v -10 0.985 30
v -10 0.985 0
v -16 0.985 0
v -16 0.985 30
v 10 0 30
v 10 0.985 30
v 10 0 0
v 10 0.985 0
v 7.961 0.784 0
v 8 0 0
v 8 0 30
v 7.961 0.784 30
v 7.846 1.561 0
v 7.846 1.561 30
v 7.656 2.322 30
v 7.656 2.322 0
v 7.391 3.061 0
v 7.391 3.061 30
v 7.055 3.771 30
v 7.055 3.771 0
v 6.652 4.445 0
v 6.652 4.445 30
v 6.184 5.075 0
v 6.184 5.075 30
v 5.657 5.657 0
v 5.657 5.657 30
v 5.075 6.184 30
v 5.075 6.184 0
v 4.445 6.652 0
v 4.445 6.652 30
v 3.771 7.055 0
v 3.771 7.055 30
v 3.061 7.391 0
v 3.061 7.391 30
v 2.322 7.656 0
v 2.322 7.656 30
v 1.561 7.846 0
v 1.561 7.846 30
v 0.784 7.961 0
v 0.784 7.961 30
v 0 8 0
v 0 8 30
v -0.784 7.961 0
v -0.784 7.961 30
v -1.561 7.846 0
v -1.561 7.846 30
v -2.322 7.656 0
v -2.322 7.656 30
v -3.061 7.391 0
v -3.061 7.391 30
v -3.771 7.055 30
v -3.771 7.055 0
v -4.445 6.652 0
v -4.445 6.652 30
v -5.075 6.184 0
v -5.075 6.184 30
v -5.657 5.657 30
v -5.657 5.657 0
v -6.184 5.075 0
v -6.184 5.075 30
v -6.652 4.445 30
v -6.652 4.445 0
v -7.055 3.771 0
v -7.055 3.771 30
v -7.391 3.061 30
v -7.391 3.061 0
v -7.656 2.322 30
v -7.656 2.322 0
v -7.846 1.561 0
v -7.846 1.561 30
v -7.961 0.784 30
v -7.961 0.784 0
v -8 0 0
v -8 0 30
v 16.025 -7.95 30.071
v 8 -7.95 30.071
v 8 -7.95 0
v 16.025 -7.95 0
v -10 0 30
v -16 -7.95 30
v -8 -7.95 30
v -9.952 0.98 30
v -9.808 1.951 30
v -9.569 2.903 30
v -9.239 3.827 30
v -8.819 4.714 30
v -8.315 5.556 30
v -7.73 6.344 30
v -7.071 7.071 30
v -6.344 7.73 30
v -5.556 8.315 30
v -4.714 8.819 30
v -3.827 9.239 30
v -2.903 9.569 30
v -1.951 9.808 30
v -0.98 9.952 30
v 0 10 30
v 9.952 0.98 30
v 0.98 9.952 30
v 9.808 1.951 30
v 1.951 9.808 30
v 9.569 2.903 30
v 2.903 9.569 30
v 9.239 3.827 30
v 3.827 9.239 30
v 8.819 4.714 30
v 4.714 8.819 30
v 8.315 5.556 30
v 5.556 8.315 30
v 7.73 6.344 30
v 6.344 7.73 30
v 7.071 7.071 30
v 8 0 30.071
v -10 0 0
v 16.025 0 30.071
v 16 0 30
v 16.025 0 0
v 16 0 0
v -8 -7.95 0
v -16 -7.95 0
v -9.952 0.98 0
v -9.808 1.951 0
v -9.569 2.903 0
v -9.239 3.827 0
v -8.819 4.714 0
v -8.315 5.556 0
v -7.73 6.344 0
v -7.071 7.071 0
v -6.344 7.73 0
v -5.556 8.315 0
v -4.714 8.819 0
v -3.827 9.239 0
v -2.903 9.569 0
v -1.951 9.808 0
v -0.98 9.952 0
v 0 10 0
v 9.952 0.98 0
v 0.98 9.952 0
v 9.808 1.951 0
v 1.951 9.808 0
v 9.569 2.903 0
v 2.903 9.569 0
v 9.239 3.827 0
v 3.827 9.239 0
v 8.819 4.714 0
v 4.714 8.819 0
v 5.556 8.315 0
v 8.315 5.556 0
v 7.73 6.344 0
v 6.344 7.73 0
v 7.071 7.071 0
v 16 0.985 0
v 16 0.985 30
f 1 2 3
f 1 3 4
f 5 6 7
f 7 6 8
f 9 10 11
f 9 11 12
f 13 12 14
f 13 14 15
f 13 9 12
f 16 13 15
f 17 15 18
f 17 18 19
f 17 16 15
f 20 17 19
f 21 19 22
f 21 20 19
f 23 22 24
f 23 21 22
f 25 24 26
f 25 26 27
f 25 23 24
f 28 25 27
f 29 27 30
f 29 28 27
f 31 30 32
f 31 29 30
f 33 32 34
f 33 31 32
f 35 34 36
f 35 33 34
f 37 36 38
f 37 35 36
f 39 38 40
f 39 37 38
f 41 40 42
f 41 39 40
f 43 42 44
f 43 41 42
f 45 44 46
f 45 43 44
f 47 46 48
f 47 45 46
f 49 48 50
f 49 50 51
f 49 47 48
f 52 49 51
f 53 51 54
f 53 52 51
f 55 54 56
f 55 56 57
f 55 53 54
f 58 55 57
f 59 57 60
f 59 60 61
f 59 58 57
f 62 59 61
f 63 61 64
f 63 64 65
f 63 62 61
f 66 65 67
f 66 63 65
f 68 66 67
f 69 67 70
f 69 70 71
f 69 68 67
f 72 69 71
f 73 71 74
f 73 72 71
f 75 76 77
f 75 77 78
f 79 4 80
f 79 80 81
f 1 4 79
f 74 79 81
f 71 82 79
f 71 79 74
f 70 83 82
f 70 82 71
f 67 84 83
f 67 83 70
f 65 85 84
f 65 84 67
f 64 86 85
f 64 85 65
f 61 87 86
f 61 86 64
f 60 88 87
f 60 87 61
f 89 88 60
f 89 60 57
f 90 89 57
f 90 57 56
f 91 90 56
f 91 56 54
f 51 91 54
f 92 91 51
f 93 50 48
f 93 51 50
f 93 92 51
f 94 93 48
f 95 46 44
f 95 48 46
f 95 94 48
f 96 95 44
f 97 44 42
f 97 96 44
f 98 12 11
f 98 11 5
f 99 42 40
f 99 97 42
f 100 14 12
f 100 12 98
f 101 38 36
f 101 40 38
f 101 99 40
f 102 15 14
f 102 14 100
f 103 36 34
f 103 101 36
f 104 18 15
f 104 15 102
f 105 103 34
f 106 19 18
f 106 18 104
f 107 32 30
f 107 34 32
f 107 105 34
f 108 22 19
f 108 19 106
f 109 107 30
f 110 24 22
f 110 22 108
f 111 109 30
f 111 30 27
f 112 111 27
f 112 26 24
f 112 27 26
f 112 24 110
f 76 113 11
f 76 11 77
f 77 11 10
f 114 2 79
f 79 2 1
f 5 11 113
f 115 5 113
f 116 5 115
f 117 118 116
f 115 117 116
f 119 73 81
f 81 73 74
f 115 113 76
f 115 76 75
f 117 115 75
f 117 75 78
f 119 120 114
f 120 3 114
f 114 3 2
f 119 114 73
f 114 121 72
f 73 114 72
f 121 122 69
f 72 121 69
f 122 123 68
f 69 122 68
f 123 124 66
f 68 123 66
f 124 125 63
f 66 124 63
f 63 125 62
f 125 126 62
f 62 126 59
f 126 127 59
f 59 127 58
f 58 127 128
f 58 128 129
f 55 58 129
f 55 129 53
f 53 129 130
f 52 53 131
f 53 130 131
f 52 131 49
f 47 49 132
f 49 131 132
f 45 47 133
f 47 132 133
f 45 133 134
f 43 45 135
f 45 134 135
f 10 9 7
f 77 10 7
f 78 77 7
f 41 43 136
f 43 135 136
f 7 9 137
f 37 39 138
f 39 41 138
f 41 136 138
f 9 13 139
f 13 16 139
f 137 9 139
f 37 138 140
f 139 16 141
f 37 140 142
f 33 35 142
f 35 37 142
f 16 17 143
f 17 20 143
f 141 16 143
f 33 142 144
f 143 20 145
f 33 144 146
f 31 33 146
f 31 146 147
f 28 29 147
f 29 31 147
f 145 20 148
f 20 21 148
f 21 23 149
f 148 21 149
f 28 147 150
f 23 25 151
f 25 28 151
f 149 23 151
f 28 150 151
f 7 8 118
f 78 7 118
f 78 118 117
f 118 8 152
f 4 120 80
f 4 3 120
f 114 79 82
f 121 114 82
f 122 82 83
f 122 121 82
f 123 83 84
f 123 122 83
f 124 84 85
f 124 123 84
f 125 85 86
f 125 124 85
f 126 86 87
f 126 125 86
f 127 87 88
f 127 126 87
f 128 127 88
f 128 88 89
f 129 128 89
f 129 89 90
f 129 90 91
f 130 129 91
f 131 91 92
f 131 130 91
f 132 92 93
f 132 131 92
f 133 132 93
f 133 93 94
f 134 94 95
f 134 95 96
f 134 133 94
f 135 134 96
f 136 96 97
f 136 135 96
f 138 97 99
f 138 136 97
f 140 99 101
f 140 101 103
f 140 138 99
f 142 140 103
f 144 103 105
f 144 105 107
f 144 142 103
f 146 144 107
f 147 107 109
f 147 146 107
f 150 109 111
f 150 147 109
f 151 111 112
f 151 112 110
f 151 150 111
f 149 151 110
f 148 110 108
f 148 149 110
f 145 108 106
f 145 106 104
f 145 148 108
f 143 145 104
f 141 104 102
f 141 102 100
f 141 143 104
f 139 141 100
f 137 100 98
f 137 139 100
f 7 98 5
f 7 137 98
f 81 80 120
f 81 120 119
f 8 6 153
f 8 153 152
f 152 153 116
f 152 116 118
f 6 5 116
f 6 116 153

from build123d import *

# Parameters (mm, degrees)
EXTRUDE_THIN1_DEPTH = 30
SKETCH2_W           = 30
SKETCH2_H           = 0.984822369
BOSS_EXTRUDE1_DEPTH = 6
SKETCH3_W           = 30
SKETCH3_H           = 0.984822369
BOSS_EXTRUDE2_DEPTH = 6
SKETCH7_W           = 8.024735178
SKETCH7_H           = 30.071065223
BOSS_EXTRUDE3_DEPTH = 7.95
SKETCH9_W           = 8
SKETCH9_H           = 30
BOSS_EXTRUDE5_DEPTH = 7.95


with BuildPart() as part:
    # Sketch1 → Extrude-Thin1 (new body)
    with BuildSketch(Plane.XY):
        with BuildLine():
            ThreePointArc((8, 0), (0, 8), (-8, 0))
            Line((-8, 0), (-10, 0))
            ThreePointArc((-10, 0), (0, 10), (10, 0))
            Line((10, 0), (8, 0))
        make_face()
    extrude(amount=EXTRUDE_THIN1_DEPTH)



with BuildPart() as body_2:
    # Sketch2 → Boss-Extrude1 (new body)
    with BuildSketch(Plane.ZY.offset(10)):
        with Locations((15, 0.492411185)):
            Rectangle(SKETCH2_W, SKETCH2_H)
    extrude(amount=BOSS_EXTRUDE1_DEPTH)


with BuildPart() as body_3:
    # Sketch3 → Boss-Extrude2 (new body)
    with BuildSketch(Plane(origin=(10, 0, 0), x_dir=(0, 0, -1), z_dir=(1, 0, 0))):
        with Locations((-15, 0.492411185)):
            Rectangle(SKETCH3_W, SKETCH3_H)
    extrude(amount=BOSS_EXTRUDE2_DEPTH)


with BuildPart() as part_1:
    add(part.part)

    add(body_3.part)  # Boss-Extrude3 merges body 3
    # Sketch7 → Boss-Extrude3 (add)
    with BuildSketch(Plane(origin=(0, 0, 0), x_dir=(1, 0, 0), z_dir=(0, 1, 0))):
        with Locations((12.012367589, -15.035532612)):
            Rectangle(SKETCH7_W, SKETCH7_H)
    extrude(amount=-BOSS_EXTRUDE3_DEPTH)


    add(body_2.part)  # Boss-Extrude5 merges body 2
    # Sketch9 → Boss-Extrude5 (add)
    with BuildSketch(Plane.XZ):
        with Locations((-12, 15)):
            Rectangle(SKETCH9_W, SKETCH9_H)
    extrude(amount=BOSS_EXTRUDE5_DEPTH)


solid = part_1.part
